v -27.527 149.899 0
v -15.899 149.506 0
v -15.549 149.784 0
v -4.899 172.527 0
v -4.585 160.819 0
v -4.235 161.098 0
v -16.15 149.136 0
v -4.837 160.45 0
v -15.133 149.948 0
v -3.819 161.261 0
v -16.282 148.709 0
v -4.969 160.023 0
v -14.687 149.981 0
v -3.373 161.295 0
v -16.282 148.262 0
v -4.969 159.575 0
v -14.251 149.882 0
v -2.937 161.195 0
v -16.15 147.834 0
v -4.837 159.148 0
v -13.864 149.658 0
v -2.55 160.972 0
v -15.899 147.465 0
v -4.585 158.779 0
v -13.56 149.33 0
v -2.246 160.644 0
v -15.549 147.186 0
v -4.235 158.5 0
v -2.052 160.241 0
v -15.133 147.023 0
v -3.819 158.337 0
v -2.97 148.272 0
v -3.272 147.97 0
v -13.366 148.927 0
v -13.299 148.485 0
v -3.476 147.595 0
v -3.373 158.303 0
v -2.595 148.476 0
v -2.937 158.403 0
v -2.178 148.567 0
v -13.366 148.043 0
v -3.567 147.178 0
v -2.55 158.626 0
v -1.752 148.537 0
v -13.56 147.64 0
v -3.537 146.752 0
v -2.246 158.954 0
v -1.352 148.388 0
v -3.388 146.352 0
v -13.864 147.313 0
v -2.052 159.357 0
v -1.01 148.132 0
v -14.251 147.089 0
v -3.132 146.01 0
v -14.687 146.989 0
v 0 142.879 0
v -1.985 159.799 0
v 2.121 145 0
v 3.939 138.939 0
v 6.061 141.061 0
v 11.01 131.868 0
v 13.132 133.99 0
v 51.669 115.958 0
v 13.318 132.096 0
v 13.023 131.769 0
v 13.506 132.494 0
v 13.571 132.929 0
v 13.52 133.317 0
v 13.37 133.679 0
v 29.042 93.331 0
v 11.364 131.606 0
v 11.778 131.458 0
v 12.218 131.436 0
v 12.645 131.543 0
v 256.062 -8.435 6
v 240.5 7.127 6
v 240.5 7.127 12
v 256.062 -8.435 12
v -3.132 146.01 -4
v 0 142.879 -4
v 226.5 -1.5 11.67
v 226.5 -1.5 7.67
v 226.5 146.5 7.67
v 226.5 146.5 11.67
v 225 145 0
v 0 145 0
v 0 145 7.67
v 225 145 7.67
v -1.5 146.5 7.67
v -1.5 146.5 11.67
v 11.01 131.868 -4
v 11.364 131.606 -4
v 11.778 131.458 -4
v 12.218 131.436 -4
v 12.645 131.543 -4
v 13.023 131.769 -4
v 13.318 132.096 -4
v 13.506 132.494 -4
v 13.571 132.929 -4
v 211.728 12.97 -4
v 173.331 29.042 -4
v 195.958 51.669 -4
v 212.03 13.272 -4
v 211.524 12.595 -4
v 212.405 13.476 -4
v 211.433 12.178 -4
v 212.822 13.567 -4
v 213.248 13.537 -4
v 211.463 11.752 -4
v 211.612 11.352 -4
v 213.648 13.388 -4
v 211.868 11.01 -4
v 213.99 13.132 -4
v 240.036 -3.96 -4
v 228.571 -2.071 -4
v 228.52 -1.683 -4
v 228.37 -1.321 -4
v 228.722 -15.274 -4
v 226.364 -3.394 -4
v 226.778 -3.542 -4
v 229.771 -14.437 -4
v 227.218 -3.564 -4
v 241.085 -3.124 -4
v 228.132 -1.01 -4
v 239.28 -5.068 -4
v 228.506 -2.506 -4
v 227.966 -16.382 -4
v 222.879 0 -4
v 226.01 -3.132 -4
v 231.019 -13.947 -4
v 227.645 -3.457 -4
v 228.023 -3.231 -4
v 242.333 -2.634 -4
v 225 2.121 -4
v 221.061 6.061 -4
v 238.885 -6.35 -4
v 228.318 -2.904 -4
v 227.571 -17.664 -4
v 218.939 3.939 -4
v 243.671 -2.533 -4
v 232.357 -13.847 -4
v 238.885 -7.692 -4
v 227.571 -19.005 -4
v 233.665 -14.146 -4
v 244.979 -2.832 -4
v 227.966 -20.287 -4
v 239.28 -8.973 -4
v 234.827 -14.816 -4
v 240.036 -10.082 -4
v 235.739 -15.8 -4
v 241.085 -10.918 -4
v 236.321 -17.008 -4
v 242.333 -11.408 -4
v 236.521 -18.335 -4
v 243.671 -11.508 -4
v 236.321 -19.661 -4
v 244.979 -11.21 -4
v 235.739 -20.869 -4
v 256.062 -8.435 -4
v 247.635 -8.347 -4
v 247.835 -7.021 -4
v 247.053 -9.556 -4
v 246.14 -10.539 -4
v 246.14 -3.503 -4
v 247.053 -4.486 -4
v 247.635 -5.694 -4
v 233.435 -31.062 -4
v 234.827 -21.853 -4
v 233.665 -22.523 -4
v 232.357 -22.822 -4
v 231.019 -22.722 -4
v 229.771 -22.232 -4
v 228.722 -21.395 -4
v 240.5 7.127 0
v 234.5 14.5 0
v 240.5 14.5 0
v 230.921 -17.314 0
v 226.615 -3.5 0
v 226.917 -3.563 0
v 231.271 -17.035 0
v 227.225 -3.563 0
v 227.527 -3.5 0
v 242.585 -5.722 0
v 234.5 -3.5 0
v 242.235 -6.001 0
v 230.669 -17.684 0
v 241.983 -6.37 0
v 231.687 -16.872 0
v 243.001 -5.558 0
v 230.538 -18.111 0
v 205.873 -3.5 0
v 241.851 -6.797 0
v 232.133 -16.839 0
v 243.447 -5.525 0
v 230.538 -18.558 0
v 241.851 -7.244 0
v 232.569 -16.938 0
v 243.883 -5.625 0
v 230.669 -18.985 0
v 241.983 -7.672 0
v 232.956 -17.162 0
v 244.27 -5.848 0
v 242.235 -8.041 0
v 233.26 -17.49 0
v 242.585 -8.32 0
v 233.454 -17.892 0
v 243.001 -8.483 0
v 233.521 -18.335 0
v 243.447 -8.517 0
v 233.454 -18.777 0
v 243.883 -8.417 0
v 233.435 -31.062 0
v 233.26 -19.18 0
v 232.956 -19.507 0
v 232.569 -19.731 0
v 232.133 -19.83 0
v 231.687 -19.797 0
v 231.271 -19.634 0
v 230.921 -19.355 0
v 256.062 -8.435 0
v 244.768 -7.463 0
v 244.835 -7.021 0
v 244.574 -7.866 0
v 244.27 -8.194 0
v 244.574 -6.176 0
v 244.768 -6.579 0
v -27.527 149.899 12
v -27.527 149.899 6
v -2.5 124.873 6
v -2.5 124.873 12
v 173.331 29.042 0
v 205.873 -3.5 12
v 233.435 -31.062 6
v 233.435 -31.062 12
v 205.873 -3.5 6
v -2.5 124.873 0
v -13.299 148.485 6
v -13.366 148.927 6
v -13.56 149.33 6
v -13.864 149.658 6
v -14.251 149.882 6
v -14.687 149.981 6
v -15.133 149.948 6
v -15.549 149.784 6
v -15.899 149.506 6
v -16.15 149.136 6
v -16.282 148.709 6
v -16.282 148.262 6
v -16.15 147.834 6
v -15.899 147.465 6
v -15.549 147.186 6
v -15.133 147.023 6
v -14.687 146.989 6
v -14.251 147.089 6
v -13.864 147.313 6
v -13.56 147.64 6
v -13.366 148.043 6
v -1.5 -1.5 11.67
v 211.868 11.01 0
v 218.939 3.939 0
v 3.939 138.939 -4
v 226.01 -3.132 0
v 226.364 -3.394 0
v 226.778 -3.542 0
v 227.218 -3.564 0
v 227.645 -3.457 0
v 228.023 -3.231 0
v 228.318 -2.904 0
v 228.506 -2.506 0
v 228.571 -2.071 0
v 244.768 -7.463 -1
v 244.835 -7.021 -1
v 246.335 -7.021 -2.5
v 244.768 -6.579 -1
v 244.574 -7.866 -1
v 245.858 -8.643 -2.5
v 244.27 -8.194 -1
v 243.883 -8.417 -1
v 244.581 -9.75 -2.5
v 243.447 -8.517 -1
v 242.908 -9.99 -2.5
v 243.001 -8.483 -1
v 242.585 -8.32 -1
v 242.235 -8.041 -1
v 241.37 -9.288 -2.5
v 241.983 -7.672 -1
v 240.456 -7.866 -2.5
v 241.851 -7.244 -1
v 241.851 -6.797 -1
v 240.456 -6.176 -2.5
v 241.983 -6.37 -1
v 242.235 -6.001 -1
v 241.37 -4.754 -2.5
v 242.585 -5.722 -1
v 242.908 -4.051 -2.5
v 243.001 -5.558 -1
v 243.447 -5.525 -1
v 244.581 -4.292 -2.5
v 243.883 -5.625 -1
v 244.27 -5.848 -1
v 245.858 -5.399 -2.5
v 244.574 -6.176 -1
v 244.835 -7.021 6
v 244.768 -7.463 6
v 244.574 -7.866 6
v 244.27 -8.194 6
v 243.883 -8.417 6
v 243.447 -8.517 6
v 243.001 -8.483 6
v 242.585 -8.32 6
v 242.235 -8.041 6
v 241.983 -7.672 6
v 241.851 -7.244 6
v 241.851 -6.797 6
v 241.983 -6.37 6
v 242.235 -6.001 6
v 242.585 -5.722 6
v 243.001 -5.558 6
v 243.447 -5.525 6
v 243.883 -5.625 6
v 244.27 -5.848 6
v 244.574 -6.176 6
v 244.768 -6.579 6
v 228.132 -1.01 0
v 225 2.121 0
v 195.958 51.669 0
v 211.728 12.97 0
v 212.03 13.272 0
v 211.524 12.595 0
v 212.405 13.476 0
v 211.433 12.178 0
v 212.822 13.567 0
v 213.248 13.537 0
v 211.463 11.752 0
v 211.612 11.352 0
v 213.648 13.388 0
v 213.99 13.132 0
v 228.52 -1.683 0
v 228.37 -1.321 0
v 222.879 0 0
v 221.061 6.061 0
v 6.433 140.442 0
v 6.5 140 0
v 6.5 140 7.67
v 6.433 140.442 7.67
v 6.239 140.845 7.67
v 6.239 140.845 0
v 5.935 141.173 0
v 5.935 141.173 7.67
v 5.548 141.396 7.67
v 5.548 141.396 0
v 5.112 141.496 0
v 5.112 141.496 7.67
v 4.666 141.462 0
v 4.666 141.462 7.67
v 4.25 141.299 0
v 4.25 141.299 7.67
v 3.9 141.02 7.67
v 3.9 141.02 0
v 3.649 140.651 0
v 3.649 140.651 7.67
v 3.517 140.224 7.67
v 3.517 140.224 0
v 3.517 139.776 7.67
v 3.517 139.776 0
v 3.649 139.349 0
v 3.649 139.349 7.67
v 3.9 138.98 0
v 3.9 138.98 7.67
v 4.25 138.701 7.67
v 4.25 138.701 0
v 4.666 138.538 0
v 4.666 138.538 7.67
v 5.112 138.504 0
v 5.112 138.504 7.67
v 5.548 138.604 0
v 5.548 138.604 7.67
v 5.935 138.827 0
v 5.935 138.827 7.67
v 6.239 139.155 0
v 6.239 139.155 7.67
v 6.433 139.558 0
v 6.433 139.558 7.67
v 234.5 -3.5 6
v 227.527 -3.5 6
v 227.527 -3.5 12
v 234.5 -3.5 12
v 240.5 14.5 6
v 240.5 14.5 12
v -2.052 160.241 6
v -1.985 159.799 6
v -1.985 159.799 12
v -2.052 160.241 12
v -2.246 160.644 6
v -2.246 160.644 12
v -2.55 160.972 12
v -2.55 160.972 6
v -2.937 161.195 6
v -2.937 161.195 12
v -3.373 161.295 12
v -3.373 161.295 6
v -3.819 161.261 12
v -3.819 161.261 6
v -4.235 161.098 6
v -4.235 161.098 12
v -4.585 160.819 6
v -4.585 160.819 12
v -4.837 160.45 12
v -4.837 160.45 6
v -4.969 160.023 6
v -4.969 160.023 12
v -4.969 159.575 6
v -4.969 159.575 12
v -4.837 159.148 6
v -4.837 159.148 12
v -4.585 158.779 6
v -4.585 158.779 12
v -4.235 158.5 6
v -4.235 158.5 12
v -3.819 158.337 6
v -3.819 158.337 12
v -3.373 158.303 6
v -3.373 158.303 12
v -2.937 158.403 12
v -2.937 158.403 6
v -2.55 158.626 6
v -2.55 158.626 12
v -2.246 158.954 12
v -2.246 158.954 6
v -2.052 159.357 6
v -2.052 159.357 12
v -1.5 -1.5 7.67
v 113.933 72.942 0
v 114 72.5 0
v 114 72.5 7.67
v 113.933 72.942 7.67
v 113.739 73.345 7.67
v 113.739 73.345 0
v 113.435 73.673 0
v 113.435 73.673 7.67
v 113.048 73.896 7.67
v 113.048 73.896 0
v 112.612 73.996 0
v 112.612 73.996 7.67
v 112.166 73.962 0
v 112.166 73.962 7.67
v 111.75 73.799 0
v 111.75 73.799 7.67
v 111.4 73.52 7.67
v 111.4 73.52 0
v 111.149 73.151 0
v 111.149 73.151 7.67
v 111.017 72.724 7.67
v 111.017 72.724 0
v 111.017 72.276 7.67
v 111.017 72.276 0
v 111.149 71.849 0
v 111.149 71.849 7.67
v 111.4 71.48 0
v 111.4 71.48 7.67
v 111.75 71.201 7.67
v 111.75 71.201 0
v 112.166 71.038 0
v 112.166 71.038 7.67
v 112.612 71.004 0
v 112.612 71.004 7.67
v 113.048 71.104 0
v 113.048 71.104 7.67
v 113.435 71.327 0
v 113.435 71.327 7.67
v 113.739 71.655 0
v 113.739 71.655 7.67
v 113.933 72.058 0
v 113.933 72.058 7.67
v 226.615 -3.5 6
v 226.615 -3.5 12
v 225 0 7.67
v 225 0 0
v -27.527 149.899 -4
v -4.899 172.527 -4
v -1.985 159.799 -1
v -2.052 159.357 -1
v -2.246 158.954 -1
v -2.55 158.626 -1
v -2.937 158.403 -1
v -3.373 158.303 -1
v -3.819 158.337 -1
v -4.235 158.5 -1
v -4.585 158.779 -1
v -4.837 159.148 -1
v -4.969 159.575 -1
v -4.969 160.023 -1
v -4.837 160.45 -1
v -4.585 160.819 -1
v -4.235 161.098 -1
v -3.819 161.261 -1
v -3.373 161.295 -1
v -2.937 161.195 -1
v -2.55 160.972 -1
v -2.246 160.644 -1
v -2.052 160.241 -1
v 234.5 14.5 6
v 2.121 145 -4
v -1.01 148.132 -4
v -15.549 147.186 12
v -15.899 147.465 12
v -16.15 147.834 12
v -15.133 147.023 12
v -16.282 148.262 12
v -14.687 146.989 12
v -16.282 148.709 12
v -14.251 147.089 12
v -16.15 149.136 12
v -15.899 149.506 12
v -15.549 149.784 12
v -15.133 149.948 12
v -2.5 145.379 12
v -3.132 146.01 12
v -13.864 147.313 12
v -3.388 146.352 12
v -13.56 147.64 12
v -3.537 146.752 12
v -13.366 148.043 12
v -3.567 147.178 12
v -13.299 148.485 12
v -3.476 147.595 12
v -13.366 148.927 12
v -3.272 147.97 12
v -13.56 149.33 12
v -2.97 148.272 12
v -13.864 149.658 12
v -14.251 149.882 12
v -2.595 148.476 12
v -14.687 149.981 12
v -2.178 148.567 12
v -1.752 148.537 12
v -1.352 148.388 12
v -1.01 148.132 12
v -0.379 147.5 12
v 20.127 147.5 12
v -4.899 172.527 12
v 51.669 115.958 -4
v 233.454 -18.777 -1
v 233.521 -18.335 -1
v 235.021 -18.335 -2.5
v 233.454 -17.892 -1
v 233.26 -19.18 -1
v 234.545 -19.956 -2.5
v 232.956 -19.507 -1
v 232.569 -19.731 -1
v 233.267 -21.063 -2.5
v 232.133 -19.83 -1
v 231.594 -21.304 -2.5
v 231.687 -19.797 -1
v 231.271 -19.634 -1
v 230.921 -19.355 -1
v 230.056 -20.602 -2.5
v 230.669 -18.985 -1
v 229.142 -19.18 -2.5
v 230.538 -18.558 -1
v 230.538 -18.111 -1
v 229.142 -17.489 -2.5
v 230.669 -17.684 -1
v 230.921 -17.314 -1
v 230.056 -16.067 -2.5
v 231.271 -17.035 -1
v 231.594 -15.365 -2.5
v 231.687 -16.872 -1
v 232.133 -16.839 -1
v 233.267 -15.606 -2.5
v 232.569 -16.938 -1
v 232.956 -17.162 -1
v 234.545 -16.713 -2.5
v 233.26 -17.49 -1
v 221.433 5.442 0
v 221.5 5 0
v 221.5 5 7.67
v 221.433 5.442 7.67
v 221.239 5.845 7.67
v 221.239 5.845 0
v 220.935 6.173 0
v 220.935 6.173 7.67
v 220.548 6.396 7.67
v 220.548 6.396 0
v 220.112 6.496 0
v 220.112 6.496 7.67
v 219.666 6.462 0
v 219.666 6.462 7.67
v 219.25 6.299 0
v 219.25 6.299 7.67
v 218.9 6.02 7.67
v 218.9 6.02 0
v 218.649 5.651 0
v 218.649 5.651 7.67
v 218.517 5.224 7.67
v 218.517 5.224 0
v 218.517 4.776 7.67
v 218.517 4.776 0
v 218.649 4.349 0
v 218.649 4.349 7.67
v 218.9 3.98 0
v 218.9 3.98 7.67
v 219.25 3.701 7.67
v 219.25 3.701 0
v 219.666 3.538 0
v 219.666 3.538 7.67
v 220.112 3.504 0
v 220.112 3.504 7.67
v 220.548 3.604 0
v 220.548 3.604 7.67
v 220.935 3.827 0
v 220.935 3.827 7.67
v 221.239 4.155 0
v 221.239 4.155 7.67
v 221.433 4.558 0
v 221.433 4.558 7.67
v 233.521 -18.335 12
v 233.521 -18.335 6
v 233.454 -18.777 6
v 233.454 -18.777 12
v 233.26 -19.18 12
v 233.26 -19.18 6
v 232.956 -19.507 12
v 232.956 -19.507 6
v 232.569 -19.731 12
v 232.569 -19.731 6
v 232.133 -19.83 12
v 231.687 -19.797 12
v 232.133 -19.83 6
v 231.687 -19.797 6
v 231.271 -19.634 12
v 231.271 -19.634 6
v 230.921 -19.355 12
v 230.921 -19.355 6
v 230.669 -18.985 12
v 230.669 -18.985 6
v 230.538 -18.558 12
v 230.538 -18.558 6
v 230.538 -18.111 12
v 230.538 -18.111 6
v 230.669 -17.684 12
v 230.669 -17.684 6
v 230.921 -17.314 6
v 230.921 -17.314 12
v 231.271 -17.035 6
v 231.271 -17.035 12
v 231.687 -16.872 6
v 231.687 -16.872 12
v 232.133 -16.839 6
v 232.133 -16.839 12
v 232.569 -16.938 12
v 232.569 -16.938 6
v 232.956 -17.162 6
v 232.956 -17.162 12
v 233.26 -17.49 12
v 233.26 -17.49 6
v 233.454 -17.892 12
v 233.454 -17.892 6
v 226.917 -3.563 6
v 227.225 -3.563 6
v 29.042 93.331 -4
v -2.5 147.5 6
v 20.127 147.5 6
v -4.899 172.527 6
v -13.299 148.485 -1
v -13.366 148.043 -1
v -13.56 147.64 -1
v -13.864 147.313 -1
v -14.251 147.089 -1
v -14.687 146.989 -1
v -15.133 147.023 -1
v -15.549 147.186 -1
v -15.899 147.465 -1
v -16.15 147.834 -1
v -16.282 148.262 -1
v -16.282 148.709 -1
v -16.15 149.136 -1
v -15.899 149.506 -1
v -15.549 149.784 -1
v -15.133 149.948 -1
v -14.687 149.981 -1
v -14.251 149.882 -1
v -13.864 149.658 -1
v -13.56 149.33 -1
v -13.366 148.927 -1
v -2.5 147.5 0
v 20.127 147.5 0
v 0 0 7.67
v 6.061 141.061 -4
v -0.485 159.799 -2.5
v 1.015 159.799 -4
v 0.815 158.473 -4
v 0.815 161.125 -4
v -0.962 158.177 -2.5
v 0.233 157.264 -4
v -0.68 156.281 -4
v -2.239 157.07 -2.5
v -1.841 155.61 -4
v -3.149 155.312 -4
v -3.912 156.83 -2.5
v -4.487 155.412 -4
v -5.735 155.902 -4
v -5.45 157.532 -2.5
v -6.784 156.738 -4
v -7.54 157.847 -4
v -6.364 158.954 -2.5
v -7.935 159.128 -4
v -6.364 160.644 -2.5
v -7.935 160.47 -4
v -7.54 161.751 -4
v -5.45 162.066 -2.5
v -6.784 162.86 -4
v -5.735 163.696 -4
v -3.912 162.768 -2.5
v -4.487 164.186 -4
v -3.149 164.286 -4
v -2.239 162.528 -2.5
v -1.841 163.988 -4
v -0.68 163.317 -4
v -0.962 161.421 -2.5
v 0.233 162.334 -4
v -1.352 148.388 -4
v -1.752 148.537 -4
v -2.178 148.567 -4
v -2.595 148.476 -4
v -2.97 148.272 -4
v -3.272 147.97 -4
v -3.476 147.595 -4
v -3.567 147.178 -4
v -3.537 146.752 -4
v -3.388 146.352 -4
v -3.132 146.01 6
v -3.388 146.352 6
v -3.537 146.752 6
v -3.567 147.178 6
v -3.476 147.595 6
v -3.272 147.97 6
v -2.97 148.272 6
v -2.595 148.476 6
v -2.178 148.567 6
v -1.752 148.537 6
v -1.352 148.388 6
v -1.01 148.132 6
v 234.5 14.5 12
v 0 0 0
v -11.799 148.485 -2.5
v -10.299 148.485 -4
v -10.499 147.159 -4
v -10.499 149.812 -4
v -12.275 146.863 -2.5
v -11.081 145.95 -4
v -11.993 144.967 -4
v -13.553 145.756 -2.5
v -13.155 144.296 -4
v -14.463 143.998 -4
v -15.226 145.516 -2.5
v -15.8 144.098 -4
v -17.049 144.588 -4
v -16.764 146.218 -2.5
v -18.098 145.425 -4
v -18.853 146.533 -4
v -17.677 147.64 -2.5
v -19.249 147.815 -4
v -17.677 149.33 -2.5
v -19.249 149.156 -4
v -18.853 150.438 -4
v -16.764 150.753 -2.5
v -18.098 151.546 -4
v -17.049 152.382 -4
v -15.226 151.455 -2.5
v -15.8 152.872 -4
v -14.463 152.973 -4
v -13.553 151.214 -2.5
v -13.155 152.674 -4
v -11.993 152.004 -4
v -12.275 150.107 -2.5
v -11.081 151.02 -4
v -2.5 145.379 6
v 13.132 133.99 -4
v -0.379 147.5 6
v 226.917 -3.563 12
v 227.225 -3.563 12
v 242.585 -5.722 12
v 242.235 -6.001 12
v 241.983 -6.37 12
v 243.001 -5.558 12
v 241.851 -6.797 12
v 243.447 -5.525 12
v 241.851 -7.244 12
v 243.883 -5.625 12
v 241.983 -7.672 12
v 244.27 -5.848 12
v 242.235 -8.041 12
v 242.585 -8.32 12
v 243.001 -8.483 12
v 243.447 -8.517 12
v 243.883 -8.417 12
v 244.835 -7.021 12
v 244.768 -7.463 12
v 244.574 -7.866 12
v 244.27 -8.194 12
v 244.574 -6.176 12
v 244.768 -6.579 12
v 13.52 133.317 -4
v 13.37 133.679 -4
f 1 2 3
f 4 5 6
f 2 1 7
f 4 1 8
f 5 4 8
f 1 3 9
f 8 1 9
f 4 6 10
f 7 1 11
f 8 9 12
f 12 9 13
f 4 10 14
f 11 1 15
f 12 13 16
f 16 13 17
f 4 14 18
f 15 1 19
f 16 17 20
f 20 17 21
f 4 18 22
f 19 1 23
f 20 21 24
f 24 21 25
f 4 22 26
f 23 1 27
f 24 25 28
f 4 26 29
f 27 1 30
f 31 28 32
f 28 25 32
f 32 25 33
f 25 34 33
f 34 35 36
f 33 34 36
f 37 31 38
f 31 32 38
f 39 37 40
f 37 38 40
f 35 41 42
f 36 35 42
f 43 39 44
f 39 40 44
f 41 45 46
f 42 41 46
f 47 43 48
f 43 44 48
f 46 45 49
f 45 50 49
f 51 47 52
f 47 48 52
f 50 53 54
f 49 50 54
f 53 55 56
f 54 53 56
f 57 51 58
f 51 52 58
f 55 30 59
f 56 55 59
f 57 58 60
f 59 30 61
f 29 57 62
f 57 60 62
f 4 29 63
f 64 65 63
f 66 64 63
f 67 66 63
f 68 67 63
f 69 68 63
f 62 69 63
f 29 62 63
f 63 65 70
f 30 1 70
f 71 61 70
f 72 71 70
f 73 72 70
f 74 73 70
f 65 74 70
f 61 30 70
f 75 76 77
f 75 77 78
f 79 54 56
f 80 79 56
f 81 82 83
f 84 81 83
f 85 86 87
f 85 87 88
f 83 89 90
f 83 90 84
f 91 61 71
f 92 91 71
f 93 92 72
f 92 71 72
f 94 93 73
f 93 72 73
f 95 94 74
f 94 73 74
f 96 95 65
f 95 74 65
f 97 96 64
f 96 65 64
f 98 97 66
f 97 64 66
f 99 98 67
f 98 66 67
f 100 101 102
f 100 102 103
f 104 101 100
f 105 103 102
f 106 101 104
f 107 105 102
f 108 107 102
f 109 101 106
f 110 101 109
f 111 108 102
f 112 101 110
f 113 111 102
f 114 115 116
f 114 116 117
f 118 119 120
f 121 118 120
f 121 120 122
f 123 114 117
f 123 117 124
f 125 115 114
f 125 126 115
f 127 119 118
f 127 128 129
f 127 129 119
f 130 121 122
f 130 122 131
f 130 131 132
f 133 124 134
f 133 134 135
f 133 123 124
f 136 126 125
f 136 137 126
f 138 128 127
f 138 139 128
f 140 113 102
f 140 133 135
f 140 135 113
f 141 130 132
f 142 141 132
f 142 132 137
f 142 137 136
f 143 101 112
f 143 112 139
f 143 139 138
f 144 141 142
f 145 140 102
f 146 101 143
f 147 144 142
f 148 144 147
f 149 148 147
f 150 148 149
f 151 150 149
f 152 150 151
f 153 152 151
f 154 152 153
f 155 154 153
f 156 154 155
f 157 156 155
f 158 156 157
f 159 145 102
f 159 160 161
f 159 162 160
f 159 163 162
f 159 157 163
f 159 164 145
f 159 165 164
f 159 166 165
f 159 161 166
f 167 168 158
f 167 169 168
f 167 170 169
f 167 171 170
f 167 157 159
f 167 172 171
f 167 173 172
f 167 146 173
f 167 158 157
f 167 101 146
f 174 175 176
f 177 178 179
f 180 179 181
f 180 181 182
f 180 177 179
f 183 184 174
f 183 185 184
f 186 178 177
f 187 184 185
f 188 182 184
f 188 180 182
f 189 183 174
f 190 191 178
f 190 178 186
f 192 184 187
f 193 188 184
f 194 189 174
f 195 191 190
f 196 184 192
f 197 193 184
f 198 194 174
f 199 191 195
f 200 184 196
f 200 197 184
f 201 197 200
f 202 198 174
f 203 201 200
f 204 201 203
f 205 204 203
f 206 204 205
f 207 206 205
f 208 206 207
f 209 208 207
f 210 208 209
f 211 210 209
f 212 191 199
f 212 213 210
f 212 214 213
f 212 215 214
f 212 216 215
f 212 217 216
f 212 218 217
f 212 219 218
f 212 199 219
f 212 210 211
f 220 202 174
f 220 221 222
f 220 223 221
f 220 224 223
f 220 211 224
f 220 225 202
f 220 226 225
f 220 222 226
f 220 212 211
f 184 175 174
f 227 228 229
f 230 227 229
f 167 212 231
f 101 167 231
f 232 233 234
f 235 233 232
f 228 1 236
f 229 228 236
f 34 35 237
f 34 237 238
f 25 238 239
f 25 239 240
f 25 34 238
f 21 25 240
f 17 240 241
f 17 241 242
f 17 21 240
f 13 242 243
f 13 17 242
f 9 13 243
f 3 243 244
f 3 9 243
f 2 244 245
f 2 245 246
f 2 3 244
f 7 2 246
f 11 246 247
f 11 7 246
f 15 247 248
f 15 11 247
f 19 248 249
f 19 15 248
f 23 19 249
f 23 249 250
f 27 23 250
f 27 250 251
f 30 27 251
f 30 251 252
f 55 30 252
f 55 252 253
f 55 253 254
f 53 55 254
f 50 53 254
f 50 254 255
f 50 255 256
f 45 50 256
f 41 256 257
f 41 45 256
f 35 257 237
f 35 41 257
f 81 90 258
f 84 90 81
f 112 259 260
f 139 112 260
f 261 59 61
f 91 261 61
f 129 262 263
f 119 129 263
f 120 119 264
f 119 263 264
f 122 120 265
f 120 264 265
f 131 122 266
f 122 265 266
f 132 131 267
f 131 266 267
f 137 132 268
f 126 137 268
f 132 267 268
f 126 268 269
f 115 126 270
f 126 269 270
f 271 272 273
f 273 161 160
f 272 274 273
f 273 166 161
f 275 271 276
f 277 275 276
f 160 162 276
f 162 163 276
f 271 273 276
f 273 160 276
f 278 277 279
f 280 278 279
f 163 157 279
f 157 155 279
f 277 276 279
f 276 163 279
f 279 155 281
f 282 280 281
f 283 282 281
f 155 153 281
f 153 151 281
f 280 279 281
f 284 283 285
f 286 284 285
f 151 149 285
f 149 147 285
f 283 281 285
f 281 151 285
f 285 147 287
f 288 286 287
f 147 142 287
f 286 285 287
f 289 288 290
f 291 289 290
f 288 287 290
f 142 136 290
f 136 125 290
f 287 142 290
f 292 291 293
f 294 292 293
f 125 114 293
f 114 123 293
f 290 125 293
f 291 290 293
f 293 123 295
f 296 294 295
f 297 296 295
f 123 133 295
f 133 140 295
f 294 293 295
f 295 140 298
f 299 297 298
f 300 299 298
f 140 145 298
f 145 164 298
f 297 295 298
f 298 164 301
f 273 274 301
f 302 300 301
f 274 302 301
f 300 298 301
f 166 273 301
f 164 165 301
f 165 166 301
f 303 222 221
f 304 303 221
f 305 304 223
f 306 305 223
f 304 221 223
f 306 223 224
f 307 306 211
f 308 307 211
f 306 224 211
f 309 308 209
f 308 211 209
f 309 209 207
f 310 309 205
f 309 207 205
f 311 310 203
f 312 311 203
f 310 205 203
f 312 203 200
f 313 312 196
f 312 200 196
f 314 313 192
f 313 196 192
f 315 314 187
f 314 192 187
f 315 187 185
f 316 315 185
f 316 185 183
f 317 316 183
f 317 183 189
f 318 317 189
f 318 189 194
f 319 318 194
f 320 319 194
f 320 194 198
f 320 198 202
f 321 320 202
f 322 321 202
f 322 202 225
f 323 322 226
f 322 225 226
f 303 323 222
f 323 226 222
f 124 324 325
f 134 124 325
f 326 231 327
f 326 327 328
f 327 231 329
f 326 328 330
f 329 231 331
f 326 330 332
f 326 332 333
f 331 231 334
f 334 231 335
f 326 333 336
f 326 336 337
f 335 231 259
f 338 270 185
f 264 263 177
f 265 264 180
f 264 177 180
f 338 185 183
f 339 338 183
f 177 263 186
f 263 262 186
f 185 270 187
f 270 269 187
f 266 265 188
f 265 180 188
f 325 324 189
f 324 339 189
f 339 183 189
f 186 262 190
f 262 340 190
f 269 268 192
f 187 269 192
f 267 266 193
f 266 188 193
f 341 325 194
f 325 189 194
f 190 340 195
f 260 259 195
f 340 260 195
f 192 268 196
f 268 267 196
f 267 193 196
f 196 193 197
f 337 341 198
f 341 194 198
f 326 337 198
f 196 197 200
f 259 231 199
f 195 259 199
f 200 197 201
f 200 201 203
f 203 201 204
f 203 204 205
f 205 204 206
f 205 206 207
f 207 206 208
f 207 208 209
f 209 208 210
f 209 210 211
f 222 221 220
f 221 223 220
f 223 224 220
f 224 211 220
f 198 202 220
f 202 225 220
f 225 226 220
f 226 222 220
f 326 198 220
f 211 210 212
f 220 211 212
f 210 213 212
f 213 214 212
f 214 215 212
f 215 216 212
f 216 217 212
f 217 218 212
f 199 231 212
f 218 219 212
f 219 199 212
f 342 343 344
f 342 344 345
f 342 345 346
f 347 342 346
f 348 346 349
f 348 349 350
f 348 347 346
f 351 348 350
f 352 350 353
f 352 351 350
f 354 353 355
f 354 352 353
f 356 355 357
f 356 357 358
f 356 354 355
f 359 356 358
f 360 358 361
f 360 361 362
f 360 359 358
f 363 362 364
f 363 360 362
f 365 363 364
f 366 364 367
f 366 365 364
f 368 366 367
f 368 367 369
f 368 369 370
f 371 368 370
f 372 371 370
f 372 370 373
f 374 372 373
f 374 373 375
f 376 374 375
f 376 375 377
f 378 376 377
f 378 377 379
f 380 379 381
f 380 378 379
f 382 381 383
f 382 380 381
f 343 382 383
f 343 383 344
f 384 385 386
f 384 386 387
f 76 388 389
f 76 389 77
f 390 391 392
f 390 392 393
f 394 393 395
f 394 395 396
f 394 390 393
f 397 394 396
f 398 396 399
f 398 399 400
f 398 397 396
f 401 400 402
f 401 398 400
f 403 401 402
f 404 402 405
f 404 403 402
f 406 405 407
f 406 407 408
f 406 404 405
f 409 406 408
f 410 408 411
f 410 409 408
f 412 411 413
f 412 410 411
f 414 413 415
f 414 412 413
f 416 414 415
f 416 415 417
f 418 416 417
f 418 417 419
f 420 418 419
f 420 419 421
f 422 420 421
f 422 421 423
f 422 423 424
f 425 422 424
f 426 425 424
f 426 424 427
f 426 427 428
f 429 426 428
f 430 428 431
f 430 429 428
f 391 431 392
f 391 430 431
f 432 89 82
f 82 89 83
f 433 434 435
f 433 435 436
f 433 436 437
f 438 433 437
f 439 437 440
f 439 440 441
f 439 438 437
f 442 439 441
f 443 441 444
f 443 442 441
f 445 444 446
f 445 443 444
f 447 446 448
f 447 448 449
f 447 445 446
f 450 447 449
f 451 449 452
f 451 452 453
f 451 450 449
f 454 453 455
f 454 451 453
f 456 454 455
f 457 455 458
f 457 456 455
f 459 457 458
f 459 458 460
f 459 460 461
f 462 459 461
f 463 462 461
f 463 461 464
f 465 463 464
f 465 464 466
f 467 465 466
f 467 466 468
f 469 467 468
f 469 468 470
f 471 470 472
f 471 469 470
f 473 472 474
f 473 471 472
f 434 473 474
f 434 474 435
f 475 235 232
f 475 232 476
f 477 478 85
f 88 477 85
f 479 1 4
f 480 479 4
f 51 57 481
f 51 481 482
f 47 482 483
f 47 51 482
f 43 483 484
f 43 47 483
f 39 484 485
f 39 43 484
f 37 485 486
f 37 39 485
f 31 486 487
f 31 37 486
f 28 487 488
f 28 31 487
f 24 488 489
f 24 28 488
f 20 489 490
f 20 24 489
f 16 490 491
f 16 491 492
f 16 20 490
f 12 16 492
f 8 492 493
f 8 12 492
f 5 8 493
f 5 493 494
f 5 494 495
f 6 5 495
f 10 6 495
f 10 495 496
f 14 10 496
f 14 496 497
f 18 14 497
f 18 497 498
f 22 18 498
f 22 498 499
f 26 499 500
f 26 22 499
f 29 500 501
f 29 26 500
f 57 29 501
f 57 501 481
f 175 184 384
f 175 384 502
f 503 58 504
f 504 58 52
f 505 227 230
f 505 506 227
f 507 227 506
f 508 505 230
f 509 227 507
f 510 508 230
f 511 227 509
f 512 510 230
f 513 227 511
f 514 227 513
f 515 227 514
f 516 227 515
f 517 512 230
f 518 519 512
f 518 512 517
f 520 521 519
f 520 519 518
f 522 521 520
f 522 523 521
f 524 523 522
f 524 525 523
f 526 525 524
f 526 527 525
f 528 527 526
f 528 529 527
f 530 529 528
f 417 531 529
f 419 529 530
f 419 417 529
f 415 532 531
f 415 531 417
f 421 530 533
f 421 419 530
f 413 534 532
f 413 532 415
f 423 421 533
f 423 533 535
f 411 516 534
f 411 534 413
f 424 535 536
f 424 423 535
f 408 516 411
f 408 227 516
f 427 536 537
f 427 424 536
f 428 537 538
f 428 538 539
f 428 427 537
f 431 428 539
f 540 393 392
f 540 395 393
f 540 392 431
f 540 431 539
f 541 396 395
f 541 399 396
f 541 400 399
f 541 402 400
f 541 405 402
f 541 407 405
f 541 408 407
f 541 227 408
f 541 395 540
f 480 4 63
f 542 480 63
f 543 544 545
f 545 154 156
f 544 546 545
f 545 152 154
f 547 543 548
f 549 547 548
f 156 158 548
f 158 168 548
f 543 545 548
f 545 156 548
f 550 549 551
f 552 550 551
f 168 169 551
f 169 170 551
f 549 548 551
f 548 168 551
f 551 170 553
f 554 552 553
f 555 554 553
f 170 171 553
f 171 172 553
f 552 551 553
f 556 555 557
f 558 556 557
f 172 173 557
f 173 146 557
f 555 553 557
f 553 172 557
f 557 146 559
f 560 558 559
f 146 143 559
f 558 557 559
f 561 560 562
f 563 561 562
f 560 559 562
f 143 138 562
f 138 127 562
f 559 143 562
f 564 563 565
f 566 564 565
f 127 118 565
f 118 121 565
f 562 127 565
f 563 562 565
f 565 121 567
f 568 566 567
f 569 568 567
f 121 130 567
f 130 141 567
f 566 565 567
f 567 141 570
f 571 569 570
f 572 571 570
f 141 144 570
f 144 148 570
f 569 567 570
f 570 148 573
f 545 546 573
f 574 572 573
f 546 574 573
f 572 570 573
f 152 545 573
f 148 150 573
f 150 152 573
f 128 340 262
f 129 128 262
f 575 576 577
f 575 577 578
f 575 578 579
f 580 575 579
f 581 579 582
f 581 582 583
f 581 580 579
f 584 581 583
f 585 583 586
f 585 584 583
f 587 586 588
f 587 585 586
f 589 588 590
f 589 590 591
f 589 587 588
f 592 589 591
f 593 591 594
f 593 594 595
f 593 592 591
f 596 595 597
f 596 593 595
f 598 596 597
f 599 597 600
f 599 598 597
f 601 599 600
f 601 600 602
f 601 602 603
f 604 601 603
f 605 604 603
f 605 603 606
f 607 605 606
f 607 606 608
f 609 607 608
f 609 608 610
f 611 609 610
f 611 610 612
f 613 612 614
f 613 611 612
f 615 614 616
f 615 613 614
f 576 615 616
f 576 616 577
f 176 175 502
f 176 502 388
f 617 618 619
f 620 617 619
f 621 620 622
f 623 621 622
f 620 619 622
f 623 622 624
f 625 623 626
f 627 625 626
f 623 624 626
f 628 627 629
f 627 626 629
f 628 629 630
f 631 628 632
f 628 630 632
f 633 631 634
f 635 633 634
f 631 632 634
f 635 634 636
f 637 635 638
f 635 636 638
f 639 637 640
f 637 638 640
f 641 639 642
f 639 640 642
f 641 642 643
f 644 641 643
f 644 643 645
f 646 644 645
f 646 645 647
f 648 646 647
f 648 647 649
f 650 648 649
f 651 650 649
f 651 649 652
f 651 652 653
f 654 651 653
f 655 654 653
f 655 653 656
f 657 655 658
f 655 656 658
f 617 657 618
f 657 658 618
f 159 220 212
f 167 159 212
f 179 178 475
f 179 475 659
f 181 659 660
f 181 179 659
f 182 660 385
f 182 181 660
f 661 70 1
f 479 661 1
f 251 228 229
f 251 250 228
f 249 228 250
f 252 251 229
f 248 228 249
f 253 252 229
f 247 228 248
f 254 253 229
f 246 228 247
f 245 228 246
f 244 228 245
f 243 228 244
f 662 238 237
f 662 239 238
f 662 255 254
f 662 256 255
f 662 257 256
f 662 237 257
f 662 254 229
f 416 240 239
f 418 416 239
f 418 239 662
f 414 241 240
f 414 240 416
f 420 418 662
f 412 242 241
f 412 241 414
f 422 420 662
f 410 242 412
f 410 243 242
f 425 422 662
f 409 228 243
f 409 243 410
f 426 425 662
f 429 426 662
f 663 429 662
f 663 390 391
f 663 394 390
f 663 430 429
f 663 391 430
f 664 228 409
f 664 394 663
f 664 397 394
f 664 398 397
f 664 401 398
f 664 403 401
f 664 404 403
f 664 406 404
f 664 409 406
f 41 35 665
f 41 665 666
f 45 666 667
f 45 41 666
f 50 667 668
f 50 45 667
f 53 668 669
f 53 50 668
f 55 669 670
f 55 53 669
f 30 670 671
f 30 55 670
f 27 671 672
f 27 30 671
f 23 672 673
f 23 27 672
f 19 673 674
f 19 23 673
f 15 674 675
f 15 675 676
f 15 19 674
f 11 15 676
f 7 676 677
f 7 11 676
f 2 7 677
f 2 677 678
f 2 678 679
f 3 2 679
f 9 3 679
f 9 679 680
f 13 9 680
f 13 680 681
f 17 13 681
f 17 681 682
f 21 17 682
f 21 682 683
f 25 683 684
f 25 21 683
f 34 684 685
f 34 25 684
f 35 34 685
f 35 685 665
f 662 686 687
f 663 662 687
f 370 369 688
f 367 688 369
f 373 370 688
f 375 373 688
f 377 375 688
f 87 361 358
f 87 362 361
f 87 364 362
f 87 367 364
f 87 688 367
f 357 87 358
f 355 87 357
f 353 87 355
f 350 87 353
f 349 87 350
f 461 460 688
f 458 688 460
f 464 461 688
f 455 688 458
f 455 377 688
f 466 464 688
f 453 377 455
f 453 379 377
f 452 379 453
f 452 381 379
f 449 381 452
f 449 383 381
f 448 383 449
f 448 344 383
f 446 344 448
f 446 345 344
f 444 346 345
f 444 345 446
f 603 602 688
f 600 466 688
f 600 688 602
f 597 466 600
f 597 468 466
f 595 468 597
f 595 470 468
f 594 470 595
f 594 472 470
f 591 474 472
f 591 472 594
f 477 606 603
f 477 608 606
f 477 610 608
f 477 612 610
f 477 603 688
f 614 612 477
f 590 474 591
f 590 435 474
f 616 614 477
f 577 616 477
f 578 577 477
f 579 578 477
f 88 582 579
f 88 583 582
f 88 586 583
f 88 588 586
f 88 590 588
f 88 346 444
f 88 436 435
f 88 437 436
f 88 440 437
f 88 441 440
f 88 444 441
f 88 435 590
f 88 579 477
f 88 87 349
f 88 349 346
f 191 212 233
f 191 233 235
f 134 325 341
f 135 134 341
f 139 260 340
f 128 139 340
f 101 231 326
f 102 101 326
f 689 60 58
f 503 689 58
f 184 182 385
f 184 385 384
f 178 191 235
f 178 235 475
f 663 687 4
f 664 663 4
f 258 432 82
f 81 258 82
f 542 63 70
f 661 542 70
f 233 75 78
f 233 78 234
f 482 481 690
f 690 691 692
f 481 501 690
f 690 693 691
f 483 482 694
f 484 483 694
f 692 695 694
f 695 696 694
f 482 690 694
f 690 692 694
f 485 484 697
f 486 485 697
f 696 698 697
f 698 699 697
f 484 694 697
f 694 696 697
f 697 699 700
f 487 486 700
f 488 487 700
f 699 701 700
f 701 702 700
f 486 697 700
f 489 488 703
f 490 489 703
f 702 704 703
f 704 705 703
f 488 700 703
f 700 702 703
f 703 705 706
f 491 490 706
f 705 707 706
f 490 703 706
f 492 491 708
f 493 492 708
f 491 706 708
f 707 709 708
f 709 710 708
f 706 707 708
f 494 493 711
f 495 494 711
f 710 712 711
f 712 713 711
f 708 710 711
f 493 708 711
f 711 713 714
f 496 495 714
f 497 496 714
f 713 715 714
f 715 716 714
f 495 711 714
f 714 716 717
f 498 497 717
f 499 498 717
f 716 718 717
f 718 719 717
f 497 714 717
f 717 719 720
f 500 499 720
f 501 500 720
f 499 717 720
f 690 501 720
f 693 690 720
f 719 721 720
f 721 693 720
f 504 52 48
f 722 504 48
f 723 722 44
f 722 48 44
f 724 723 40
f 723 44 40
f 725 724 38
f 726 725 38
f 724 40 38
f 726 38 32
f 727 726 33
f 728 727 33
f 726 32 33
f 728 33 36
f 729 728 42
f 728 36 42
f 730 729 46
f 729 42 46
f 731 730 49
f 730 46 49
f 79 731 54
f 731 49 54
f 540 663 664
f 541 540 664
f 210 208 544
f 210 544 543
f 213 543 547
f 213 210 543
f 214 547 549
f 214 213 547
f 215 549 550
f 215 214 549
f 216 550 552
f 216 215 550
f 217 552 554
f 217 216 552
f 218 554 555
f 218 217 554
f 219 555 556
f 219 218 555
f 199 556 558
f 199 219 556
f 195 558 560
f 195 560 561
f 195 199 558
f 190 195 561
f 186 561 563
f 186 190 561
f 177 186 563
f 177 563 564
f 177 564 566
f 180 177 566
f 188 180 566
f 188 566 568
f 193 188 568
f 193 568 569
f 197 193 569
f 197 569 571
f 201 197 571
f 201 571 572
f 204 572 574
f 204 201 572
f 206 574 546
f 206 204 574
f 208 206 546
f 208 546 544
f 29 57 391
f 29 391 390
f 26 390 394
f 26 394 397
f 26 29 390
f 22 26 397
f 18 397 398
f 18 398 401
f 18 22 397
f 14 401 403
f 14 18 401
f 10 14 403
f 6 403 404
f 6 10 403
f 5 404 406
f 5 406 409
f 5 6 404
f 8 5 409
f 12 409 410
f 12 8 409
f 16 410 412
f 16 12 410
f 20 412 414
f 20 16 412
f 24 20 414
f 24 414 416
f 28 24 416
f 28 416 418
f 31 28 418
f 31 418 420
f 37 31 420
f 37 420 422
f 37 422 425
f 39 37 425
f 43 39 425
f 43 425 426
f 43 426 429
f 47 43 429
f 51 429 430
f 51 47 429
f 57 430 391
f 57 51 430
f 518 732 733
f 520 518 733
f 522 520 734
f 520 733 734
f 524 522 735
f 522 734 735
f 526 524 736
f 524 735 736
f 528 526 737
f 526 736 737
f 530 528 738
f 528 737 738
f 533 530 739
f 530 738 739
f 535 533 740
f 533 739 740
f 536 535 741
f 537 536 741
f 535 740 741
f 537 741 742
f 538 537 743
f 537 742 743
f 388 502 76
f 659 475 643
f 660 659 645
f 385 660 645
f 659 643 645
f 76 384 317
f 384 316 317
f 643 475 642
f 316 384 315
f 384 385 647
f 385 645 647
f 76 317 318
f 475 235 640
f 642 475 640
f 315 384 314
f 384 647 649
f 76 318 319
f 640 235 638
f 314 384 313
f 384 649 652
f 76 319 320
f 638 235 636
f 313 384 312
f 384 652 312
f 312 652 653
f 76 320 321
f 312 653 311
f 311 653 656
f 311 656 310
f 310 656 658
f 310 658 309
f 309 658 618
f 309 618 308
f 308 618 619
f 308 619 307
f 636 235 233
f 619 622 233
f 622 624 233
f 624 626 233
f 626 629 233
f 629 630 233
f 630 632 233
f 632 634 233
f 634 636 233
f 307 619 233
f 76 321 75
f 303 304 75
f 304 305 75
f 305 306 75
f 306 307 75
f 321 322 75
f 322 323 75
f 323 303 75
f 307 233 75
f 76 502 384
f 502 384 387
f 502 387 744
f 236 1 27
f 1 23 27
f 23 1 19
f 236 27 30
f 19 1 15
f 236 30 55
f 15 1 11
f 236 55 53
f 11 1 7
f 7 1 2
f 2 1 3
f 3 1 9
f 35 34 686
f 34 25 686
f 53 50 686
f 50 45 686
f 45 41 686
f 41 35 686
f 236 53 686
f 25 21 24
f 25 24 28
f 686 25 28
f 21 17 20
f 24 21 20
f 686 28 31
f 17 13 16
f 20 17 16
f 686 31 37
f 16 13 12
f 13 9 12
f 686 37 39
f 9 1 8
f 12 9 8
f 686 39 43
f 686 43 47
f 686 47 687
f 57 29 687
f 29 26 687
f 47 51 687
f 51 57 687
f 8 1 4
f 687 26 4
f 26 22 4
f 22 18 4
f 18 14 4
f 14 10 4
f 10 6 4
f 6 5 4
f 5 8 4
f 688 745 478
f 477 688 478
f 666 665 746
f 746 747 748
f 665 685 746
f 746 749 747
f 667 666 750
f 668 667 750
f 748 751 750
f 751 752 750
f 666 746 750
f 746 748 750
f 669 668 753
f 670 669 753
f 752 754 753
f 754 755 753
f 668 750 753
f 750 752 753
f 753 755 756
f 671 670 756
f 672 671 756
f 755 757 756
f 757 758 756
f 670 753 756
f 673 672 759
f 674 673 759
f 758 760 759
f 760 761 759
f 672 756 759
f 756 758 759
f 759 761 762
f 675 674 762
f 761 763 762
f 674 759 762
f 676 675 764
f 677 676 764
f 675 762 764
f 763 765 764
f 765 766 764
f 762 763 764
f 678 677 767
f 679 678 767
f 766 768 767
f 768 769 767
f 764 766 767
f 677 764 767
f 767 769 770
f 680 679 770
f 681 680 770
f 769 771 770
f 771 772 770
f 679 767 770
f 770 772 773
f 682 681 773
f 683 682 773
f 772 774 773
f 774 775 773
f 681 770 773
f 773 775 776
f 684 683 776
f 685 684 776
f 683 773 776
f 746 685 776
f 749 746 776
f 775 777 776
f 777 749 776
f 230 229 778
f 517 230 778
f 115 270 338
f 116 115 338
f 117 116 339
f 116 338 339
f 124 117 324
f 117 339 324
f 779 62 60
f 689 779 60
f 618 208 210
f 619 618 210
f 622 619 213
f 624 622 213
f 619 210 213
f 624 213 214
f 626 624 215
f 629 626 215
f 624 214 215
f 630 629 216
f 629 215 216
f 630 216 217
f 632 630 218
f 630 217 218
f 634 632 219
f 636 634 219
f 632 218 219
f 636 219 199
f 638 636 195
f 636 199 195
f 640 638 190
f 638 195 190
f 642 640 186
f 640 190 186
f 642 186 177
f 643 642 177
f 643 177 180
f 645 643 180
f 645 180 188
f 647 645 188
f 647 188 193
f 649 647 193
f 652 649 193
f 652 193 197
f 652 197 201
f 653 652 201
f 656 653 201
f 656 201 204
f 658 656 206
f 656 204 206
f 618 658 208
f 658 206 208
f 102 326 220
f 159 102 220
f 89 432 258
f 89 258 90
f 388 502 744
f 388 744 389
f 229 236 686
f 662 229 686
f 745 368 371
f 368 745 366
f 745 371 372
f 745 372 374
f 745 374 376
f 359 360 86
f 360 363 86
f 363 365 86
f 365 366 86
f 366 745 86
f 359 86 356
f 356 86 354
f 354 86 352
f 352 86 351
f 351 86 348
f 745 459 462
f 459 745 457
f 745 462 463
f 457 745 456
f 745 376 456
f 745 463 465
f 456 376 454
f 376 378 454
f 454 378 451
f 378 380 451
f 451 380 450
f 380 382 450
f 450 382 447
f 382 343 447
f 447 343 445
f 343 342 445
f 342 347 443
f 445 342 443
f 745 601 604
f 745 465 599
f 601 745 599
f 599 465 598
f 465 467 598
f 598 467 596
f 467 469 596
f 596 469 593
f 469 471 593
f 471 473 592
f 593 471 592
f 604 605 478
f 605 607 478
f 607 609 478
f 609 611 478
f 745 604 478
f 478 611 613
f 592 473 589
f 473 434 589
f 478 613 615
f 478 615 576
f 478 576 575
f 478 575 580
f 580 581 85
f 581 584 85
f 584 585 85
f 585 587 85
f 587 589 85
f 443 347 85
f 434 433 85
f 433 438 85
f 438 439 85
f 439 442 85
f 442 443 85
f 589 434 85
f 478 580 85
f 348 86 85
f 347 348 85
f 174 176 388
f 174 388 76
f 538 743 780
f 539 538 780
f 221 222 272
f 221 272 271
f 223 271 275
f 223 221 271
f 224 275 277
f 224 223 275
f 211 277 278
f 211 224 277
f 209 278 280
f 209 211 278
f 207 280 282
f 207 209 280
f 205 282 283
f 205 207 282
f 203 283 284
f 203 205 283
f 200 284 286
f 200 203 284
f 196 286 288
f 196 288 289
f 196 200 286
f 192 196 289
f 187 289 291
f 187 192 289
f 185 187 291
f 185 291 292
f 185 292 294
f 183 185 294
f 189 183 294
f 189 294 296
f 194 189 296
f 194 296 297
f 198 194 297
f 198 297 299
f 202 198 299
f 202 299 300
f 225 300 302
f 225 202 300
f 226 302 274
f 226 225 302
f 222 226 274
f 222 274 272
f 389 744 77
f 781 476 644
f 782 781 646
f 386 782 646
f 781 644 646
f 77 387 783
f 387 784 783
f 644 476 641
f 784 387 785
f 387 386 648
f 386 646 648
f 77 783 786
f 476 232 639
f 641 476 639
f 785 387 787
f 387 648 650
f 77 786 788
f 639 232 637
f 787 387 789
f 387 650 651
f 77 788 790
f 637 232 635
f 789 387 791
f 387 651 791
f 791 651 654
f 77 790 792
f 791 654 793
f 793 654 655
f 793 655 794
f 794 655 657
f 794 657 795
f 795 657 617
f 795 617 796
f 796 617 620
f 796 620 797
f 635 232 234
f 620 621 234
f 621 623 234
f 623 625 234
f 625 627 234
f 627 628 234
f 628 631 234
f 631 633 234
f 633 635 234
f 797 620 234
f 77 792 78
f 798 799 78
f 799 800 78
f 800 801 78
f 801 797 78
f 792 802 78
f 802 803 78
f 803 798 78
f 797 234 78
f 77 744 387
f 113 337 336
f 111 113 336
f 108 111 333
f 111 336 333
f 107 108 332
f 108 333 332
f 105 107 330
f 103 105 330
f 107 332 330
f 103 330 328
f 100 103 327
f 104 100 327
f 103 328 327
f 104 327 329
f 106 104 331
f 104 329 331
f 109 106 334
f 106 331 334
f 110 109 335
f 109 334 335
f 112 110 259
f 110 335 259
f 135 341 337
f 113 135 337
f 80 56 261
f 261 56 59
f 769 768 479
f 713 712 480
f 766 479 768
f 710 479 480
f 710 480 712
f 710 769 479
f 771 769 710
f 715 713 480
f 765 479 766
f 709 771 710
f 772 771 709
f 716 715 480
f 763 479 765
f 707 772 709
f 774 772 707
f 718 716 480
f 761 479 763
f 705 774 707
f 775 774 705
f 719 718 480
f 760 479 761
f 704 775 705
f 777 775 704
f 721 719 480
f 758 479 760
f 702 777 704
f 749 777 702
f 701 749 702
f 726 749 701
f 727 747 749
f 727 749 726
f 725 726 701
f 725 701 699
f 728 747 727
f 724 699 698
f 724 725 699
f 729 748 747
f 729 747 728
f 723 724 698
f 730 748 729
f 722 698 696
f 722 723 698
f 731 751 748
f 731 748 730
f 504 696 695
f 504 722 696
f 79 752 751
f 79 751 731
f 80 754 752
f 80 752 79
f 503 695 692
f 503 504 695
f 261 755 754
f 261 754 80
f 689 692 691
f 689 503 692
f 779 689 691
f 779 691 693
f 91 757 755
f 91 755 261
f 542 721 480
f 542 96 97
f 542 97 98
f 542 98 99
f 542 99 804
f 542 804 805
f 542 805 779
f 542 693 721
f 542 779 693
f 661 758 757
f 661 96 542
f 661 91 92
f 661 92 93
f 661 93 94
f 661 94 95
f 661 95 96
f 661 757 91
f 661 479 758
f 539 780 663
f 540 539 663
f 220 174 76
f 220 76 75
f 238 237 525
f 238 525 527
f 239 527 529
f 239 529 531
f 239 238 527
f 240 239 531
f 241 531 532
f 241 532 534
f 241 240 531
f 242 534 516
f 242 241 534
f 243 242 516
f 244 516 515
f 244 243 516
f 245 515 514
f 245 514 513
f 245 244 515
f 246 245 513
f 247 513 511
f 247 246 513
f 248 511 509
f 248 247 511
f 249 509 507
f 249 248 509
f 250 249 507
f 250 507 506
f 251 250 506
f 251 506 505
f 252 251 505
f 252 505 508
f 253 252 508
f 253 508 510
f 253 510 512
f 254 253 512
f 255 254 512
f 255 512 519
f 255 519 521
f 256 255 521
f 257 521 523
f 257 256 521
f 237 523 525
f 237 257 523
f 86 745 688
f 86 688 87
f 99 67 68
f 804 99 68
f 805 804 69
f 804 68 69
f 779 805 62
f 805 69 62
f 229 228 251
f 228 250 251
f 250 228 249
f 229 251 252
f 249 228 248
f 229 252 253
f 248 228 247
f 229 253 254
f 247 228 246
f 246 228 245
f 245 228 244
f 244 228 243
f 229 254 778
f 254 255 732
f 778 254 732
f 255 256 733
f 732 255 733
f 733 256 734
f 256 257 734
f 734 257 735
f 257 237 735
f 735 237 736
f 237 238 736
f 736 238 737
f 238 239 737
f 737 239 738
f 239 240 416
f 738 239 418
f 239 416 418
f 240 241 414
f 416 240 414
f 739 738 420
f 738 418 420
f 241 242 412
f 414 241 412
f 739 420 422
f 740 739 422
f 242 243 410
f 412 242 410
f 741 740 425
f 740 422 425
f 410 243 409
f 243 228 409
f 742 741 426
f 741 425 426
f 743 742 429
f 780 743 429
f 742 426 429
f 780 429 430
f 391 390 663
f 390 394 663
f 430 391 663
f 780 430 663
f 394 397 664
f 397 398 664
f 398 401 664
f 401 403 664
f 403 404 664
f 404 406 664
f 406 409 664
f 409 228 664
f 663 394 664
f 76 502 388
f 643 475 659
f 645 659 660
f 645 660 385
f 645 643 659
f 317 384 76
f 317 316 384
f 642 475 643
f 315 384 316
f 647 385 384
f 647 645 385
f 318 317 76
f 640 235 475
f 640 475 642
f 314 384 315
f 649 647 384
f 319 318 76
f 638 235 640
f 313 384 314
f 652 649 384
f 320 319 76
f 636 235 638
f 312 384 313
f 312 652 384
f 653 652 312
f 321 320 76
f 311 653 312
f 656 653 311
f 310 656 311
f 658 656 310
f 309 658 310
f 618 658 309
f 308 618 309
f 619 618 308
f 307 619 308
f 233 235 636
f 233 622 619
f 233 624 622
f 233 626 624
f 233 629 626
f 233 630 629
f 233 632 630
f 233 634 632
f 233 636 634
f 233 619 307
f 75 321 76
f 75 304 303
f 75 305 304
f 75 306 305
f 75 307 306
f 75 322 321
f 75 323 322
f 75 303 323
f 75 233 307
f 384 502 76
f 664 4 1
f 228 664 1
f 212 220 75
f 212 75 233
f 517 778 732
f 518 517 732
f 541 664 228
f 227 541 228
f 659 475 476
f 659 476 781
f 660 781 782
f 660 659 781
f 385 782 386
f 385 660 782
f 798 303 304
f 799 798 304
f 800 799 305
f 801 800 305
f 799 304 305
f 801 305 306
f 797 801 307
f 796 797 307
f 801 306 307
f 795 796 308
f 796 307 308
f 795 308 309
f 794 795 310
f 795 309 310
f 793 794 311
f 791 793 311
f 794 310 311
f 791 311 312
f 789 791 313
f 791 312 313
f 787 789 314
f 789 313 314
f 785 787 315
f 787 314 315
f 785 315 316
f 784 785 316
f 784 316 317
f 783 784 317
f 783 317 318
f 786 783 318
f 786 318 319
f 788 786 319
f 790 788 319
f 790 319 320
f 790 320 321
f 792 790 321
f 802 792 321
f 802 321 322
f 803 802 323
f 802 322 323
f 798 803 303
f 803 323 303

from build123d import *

# Parameters (mm, degrees)
F1_W      = 225
F1_H      = 145
F1_R      = 1.5
F2_DEPTH  = 7.67
F3_START  = 7.67
F1_W_2    = 228
F1_H_2    = 148
F3_DEPTH  = 4
F4_R      = 1.5
F5_DEPTH  = 4
F6_DEPTH  = 4
F7_SIZE   = 3
F7_2_SIZE = 3
F8_R      = 1.5
F9_DEPTH  = 6
F10_START = 6
F10_DEPTH = 6
F11_R     = 1.5
F12_DEPTH = 6
F13_START = -6
F13_DEPTH = 6


with BuildPart() as f2:
    # F1 (on Top) → F2 (new body)
    with BuildSketch(Plane.XY):
        with Locations((112.5, 72.5)):
            Rectangle(F1_W, F1_H)
        with Locations((220, 5)):
            Circle(F1_R, mode=Mode.SUBTRACT)
        with Locations((5, 140)):
            Circle(F1_R, mode=Mode.SUBTRACT)
        with Locations((112.5, 72.5)):
            Circle(F1_R, mode=Mode.SUBTRACT)
    extrude(amount=F2_DEPTH)


with BuildPart() as f3:
    # F1 (on Top) → F3 (new body)
    with BuildSketch(Plane.XY.offset(F3_START)):
        with Locations((112.5, 72.5)):
            Rectangle(F1_W_2, F1_H_2)
        with Locations((112.5, 72.5)):
            Rectangle(F1_W, F1_H, mode=Mode.SUBTRACT)
        with Locations((112.5, 72.5)):
            Rectangle(F1_W, F1_H)
        with Locations((220, 5)):
            Circle(F1_R, mode=Mode.SUBTRACT)
        with Locations((5, 140)):
            Circle(F1_R, mode=Mode.SUBTRACT)
        with Locations((112.5, 72.5)):
            Circle(F1_R, mode=Mode.SUBTRACT)
        with Locations((5, 140)):
            Circle(F1_R)
        with Locations((220, 5)):
            Circle(F1_R)
        with Locations((112.5, 72.5)):
            Circle(F1_R)
    extrude(amount=F3_DEPTH)


with BuildPart() as f5:
    # F4 (on face) → F5 (new body)
    with BuildSketch(Plane(origin=(0, 0, 0), x_dir=(1, 0, 0), z_dir=(0, 0, -1))):
        with BuildLine():
            Line((2.1213203436, -145), (22.627416998, -145))
            Line((22.627416998, -145), (51.6690475583, -115.9583694397))
            Line((51.6690475583, -115.9583694397), (29.0416305603, -93.3309524417))
            Line((29.0416305603, -93.3309524417), (0, -122.372583002))
            Line((0, -122.372583002), (0, -142.8786796564))
            Line((0, -142.8786796564), (3.9393398213, -138.9393398351))
            Line((3.9393398213, -138.9393398351), (11.0104076401, -131.8682720164))
            ThreePointArc((11.0104076401, -131.8682720164), (12.6450929604, -131.5431128894), (13.5710678119, -132.9289321881))
            ThreePointArc((13.5710678119, -132.9289321881), (13.4568871106, -133.5029573367), (13.1317279836, -133.9895923599))
            Line((13.1317279836, -133.9895923599), (6.0606602025, -141.060660141))
            Line((6.0606602025, -141.060660141), (2.1213203436, -145))
        make_face()
        with BuildLine():
            Line((-4.8994949366, -172.5269119346), (22.627416998, -145))
            Line((22.627416998, -145), (2.1213203436, -145))
            Line((2.1213203436, -145), (-1.0104076401, -148.1317279836))
            ThreePointArc((-1.0104076401, -148.1317279836), (-3.1317279836, -148.1317279836), (-3.1317279836, -146.0104076401))
            Line((-3.1317279836, -146.0104076401), (0, -142.8786796564))
            Line((0, -142.8786796564), (0, -122.372583002))
            Line((0, -122.372583002), (-27.5269119346, -149.8994949366))
            Line((-27.5269119346, -149.8994949366), (-4.8994949366, -172.5269119346))
        make_face()
        with Locations((-14.7989898732, -148.4852813742)):
            Circle(F4_R, mode=Mode.SUBTRACT)
        with Locations((-3.4852813742, -159.7989898732)):
            Circle(F4_R, mode=Mode.SUBTRACT)
    extrude(amount=F5_DEPTH)

    # F7#2
    f7_2_edges = [f5.edges().sort_by_distance(p)[0] for p in [
        (-16.29899, 148.485281, -4),
        (-4.985281, 159.79899, -4),
    ]]
    chamfer(f7_2_edges, length=F7_2_SIZE)


with BuildPart() as f6:
    # F4 (on face) → F6 (new body)
    with BuildSketch(Plane(origin=(0, 0, 0), x_dir=(1, 0, 0), z_dir=(0, 0, -1))):
        with BuildLine():
            Line((225, -2.1213203436), (225, -22.627416998))
            Line((225, -22.627416998), (256.0624458405, 8.4350288425))
            Line((256.0624458405, 8.4350288425), (233.4350288425, 31.0624458405))
            Line((233.4350288425, 31.0624458405), (202.372583002, 0))
            Line((202.372583002, 0), (222.8786796564, 0))
            Line((222.8786796564, 0), (226.0104076401, 3.1317279836))
            ThreePointArc((226.0104076401, 3.1317279836), (227.6450929604, 3.4568871106), (228.5710678119, 2.0710678119))
            ThreePointArc((228.5710678119, 2.0710678119), (228.4568871106, 1.4970426633), (228.1317279836, 1.0104076401))
            Line((228.1317279836, 1.0104076401), (225, -2.1213203436))
        make_face()
        with Locations((232.0208152802, 18.3345237792)):
            Circle(F4_R, mode=Mode.SUBTRACT)
        with Locations((243.3345237792, 7.0208152802)):
            Circle(F4_R, mode=Mode.SUBTRACT)
        with BuildLine():
            Line((173.3309524417, -29.0416305603), (195.9583694397, -51.6690475583))
            Line((195.9583694397, -51.6690475583), (225, -22.627416998))
            Line((225, -22.627416998), (225, -2.1213203436))
            Line((225, -2.1213203436), (221.0606601718, -6.0606601718))
            Line((221.0606601718, -6.0606601718), (213.9895923599, -13.1317279836))
            ThreePointArc((213.9895923599, -13.1317279836), (211.8682720164, -13.1317279836), (211.8682720164, -11.0104076401))
            Line((211.8682720164, -11.0104076401), (218.9393398374, -3.939339819))
            Line((218.9393398374, -3.939339819), (222.8786796564, 0))
            Line((222.8786796564, 0), (202.372583002, 0))
            Line((202.372583002, 0), (173.3309524417, -29.0416305603))
        make_face()
    extrude(amount=F6_DEPTH)

    # F7
    f7_edges = [f6.edges().sort_by_distance(p)[0] for p in [
        (230.520815, -18.334524, -4),
        (241.834524, -7.020815, -4),
    ]]
    chamfer(f7_edges, length=F7_SIZE)


with BuildPart() as f9:
    # F8 (on face) → F9 (new body)
    with BuildSketch(Plane.XY):
        Polygon((20.127416998, 147.5), (-4.8994949366, 172.5269119346), (-27.5269119346, 149.8994949366), (-2.5, 124.872583002), (-2.5, 147.5), align=None)
        with Locations((-14.7989898732, 148.4852813742)):
            Circle(F8_R, mode=Mode.SUBTRACT)
        with Locations((-3.4852813742, 159.7989898732)):
            Circle(F8_R, mode=Mode.SUBTRACT)
    extrude(amount=F9_DEPTH)


with BuildPart() as f10:
    # F8 (on face) → F10 (new body)
    with BuildSketch(Plane.XY.offset(F10_START)):
        with BuildLine():
            Line((20.127416998, 147.5), (-4.8994949366, 172.5269119346))
            Line((-4.8994949366, 172.5269119346), (-27.5269119346, 149.8994949366))
            Line((-27.5269119346, 149.8994949366), (-2.5, 124.872583002))
            Line((-2.5, 124.872583002), (-2.5, 145.3786796564))
            Line((-2.5, 145.3786796564), (-3.1317279836, 146.0104076401))
            ThreePointArc((-3.1317279836, 146.0104076401), (-3.1317279836, 148.1317279836), (-1.0104076401, 148.1317279836))
            Line((-1.0104076401, 148.1317279836), (-0.3786796564, 147.5))
            Line((-0.3786796564, 147.5), (20.127416998, 147.5))
        make_face()
        with Locations((-14.7989898732, 148.4852813742)):
            Circle(F8_R, mode=Mode.SUBTRACT)
        with Locations((-3.4852813742, 159.7989898732)):
            Circle(F8_R, mode=Mode.SUBTRACT)
    extrude(amount=F10_DEPTH)


with BuildPart() as f12:
    # F11 (on face) → F12 (new body)
    with BuildSketch(Plane(origin=(0, 0, 0), x_dir=(1, 0, 0), z_dir=(0, 0, -1))):
        with BuildLine():
            Line((233.4350288425, 31.0624458405), (205.872583002, 3.5))
            Line((205.872583002, 3.5), (226.6148301526, 3.5))
            ThreePointArc((226.6148301526, 3.5), (227.0710678119, 3.5710678119), (227.5273054711, 3.5))
            Line((227.5273054711, 3.5), (234.5, 3.5))
            Line((234.5, 3.5), (234.5, -13.127416998))
            Line((234.5, -13.127416998), (240.5, -7.127416998))
            Line((240.5, -7.127416998), (256.0624458405, 8.4350288425))
            Line((256.0624458405, 8.4350288425), (233.4350288425, 31.0624458405))
        make_face()
        with Locations((243.3345237792, 7.0208152802)):
            Circle(F11_R, mode=Mode.SUBTRACT)
        with Locations((232.0208152802, 18.3345237792)):
            Circle(F11_R, mode=Mode.SUBTRACT)
        Polygon((240.5, -14.5), (240.5, -7.127416998), (234.5, -13.127416998), (234.5, -14.5), align=None)
    extrude(amount=-F12_DEPTH)


with BuildPart() as f13:
    # F11 (on face) → F13 (new body)
    with BuildSketch(Plane(origin=(0, 0, 0), x_dir=(1, 0, 0), z_dir=(0, 0, -1)).offset(F13_START)):
        with BuildLine():
            Line((233.4350288425, 31.0624458405), (205.872583002, 3.5))
            Line((205.872583002, 3.5), (226.6148301526, 3.5))
            ThreePointArc((226.6148301526, 3.5), (227.0710678119, 3.5710678119), (227.5273054711, 3.5))
            Line((227.5273054711, 3.5), (234.5, 3.5))
            Line((234.5, 3.5), (234.5, -13.127416998))
            Line((234.5, -13.127416998), (240.5, -7.127416998))
            Line((240.5, -7.127416998), (256.0624458405, 8.4350288425))
            Line((256.0624458405, 8.4350288425), (233.4350288425, 31.0624458405))
        make_face()
        with Locations((243.3345237792, 7.0208152802)):
            Circle(F11_R, mode=Mode.SUBTRACT)
        with Locations((232.0208152802, 18.3345237792)):
            Circle(F11_R, mode=Mode.SUBTRACT)
        Polygon((240.5, -14.5), (240.5, -7.127416998), (234.5, -13.127416998), (234.5, -14.5), align=None)
    extrude(amount=-F13_DEPTH)


solid = Compound([f2.part, f3.part, f5.part, f6.part, f9.part, f10.part, f12.part, f13.part])
